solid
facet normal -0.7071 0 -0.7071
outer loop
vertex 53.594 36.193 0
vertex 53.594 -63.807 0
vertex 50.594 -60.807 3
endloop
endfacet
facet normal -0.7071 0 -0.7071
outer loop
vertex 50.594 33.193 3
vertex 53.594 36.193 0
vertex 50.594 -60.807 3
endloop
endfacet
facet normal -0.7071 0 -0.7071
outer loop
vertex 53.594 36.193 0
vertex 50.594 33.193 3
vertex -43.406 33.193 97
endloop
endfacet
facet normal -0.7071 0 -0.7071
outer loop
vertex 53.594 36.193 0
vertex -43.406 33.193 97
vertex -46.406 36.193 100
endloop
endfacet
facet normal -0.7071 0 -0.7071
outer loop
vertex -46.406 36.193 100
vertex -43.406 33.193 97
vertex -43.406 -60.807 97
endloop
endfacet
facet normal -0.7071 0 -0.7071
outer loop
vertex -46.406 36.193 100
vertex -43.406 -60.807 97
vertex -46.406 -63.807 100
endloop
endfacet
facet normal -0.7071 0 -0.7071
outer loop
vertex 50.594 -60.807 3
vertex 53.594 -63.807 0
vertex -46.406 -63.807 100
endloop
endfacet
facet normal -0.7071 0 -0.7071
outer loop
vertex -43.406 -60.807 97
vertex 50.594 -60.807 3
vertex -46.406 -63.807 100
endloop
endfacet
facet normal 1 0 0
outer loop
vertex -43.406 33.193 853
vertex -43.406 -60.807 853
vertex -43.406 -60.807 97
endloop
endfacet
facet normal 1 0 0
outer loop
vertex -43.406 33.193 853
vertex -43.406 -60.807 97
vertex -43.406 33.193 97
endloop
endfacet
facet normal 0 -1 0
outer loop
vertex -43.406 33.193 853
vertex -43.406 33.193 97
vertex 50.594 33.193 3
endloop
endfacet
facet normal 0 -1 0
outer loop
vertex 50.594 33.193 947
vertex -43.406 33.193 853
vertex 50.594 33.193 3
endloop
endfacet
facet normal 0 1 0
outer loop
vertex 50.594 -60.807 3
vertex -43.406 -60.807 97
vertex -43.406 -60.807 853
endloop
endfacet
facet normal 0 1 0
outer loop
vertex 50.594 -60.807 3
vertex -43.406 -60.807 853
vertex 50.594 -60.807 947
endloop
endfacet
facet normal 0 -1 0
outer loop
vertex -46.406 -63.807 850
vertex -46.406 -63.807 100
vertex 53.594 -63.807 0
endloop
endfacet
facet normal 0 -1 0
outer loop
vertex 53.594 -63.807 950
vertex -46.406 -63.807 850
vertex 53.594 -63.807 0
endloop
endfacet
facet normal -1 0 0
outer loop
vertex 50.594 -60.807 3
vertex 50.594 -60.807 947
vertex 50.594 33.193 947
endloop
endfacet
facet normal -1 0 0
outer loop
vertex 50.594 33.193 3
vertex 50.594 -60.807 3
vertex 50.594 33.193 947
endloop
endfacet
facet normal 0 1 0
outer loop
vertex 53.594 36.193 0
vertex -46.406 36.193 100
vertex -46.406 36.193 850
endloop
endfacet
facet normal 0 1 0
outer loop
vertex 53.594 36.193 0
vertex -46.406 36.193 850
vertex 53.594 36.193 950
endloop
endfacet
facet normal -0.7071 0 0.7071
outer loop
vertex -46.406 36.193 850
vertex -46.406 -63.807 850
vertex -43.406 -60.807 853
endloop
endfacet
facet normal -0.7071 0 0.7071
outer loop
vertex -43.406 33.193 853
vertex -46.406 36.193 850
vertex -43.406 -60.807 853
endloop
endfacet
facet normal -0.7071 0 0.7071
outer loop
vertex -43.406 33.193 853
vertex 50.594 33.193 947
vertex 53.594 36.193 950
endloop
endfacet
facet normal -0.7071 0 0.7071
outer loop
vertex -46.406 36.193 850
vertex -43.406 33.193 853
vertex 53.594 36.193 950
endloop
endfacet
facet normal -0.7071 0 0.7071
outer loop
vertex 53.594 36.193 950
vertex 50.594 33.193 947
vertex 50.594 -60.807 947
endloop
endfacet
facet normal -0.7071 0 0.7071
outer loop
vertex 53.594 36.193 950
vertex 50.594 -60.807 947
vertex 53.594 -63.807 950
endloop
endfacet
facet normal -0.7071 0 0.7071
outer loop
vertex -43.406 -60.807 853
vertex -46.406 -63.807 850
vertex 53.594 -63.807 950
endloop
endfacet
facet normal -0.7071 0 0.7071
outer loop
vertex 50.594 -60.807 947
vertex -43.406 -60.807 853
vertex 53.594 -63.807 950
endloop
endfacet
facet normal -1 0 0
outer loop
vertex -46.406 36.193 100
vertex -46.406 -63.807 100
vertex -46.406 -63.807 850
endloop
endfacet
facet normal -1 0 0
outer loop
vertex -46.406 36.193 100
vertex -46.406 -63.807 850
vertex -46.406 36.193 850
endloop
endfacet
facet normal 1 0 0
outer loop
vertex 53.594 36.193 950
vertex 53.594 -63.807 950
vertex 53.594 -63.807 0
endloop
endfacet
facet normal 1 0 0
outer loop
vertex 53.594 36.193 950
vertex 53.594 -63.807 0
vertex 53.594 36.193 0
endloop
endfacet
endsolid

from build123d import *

# Parameters (mm, degrees)
F0_W     = 100
F0_H     = 100
F0_W_2   = 94
F0_H_2   = 94
F1_DEPTH = 950
F3_DEPTH = 100
F5_DEPTH = 100


with BuildPart() as f1:
    # F0 (on Top) → F1 (new body)
    with BuildSketch(Plane.XY):
        with Locations((3.593751, -13.807164)):
            Rectangle(F0_W, F0_H)
        with Locations((3.593751, -13.807164)):
            Rectangle(F0_W_2, F0_H_2, mode=Mode.SUBTRACT)
    extrude(amount=F1_DEPTH)

    # F2 (on face) → F3 (cut)
    with BuildSketch(Plane.XZ.offset(63.807164)):
        Polygon((-46.406249, 850), (53.593751, 950), (-46.406249, 950), align=None)
    extrude(amount=-F3_DEPTH, mode=Mode.SUBTRACT)

    # F4 (on face) → F5 (cut)
    with BuildSketch(Plane.XZ.offset(63.807164)):
        Polygon((-46.406249, 0), (53.593751, 0), (-46.406249, 100), align=None)
    extrude(amount=-F5_DEPTH, mode=Mode.SUBTRACT)


solid = f1.part
